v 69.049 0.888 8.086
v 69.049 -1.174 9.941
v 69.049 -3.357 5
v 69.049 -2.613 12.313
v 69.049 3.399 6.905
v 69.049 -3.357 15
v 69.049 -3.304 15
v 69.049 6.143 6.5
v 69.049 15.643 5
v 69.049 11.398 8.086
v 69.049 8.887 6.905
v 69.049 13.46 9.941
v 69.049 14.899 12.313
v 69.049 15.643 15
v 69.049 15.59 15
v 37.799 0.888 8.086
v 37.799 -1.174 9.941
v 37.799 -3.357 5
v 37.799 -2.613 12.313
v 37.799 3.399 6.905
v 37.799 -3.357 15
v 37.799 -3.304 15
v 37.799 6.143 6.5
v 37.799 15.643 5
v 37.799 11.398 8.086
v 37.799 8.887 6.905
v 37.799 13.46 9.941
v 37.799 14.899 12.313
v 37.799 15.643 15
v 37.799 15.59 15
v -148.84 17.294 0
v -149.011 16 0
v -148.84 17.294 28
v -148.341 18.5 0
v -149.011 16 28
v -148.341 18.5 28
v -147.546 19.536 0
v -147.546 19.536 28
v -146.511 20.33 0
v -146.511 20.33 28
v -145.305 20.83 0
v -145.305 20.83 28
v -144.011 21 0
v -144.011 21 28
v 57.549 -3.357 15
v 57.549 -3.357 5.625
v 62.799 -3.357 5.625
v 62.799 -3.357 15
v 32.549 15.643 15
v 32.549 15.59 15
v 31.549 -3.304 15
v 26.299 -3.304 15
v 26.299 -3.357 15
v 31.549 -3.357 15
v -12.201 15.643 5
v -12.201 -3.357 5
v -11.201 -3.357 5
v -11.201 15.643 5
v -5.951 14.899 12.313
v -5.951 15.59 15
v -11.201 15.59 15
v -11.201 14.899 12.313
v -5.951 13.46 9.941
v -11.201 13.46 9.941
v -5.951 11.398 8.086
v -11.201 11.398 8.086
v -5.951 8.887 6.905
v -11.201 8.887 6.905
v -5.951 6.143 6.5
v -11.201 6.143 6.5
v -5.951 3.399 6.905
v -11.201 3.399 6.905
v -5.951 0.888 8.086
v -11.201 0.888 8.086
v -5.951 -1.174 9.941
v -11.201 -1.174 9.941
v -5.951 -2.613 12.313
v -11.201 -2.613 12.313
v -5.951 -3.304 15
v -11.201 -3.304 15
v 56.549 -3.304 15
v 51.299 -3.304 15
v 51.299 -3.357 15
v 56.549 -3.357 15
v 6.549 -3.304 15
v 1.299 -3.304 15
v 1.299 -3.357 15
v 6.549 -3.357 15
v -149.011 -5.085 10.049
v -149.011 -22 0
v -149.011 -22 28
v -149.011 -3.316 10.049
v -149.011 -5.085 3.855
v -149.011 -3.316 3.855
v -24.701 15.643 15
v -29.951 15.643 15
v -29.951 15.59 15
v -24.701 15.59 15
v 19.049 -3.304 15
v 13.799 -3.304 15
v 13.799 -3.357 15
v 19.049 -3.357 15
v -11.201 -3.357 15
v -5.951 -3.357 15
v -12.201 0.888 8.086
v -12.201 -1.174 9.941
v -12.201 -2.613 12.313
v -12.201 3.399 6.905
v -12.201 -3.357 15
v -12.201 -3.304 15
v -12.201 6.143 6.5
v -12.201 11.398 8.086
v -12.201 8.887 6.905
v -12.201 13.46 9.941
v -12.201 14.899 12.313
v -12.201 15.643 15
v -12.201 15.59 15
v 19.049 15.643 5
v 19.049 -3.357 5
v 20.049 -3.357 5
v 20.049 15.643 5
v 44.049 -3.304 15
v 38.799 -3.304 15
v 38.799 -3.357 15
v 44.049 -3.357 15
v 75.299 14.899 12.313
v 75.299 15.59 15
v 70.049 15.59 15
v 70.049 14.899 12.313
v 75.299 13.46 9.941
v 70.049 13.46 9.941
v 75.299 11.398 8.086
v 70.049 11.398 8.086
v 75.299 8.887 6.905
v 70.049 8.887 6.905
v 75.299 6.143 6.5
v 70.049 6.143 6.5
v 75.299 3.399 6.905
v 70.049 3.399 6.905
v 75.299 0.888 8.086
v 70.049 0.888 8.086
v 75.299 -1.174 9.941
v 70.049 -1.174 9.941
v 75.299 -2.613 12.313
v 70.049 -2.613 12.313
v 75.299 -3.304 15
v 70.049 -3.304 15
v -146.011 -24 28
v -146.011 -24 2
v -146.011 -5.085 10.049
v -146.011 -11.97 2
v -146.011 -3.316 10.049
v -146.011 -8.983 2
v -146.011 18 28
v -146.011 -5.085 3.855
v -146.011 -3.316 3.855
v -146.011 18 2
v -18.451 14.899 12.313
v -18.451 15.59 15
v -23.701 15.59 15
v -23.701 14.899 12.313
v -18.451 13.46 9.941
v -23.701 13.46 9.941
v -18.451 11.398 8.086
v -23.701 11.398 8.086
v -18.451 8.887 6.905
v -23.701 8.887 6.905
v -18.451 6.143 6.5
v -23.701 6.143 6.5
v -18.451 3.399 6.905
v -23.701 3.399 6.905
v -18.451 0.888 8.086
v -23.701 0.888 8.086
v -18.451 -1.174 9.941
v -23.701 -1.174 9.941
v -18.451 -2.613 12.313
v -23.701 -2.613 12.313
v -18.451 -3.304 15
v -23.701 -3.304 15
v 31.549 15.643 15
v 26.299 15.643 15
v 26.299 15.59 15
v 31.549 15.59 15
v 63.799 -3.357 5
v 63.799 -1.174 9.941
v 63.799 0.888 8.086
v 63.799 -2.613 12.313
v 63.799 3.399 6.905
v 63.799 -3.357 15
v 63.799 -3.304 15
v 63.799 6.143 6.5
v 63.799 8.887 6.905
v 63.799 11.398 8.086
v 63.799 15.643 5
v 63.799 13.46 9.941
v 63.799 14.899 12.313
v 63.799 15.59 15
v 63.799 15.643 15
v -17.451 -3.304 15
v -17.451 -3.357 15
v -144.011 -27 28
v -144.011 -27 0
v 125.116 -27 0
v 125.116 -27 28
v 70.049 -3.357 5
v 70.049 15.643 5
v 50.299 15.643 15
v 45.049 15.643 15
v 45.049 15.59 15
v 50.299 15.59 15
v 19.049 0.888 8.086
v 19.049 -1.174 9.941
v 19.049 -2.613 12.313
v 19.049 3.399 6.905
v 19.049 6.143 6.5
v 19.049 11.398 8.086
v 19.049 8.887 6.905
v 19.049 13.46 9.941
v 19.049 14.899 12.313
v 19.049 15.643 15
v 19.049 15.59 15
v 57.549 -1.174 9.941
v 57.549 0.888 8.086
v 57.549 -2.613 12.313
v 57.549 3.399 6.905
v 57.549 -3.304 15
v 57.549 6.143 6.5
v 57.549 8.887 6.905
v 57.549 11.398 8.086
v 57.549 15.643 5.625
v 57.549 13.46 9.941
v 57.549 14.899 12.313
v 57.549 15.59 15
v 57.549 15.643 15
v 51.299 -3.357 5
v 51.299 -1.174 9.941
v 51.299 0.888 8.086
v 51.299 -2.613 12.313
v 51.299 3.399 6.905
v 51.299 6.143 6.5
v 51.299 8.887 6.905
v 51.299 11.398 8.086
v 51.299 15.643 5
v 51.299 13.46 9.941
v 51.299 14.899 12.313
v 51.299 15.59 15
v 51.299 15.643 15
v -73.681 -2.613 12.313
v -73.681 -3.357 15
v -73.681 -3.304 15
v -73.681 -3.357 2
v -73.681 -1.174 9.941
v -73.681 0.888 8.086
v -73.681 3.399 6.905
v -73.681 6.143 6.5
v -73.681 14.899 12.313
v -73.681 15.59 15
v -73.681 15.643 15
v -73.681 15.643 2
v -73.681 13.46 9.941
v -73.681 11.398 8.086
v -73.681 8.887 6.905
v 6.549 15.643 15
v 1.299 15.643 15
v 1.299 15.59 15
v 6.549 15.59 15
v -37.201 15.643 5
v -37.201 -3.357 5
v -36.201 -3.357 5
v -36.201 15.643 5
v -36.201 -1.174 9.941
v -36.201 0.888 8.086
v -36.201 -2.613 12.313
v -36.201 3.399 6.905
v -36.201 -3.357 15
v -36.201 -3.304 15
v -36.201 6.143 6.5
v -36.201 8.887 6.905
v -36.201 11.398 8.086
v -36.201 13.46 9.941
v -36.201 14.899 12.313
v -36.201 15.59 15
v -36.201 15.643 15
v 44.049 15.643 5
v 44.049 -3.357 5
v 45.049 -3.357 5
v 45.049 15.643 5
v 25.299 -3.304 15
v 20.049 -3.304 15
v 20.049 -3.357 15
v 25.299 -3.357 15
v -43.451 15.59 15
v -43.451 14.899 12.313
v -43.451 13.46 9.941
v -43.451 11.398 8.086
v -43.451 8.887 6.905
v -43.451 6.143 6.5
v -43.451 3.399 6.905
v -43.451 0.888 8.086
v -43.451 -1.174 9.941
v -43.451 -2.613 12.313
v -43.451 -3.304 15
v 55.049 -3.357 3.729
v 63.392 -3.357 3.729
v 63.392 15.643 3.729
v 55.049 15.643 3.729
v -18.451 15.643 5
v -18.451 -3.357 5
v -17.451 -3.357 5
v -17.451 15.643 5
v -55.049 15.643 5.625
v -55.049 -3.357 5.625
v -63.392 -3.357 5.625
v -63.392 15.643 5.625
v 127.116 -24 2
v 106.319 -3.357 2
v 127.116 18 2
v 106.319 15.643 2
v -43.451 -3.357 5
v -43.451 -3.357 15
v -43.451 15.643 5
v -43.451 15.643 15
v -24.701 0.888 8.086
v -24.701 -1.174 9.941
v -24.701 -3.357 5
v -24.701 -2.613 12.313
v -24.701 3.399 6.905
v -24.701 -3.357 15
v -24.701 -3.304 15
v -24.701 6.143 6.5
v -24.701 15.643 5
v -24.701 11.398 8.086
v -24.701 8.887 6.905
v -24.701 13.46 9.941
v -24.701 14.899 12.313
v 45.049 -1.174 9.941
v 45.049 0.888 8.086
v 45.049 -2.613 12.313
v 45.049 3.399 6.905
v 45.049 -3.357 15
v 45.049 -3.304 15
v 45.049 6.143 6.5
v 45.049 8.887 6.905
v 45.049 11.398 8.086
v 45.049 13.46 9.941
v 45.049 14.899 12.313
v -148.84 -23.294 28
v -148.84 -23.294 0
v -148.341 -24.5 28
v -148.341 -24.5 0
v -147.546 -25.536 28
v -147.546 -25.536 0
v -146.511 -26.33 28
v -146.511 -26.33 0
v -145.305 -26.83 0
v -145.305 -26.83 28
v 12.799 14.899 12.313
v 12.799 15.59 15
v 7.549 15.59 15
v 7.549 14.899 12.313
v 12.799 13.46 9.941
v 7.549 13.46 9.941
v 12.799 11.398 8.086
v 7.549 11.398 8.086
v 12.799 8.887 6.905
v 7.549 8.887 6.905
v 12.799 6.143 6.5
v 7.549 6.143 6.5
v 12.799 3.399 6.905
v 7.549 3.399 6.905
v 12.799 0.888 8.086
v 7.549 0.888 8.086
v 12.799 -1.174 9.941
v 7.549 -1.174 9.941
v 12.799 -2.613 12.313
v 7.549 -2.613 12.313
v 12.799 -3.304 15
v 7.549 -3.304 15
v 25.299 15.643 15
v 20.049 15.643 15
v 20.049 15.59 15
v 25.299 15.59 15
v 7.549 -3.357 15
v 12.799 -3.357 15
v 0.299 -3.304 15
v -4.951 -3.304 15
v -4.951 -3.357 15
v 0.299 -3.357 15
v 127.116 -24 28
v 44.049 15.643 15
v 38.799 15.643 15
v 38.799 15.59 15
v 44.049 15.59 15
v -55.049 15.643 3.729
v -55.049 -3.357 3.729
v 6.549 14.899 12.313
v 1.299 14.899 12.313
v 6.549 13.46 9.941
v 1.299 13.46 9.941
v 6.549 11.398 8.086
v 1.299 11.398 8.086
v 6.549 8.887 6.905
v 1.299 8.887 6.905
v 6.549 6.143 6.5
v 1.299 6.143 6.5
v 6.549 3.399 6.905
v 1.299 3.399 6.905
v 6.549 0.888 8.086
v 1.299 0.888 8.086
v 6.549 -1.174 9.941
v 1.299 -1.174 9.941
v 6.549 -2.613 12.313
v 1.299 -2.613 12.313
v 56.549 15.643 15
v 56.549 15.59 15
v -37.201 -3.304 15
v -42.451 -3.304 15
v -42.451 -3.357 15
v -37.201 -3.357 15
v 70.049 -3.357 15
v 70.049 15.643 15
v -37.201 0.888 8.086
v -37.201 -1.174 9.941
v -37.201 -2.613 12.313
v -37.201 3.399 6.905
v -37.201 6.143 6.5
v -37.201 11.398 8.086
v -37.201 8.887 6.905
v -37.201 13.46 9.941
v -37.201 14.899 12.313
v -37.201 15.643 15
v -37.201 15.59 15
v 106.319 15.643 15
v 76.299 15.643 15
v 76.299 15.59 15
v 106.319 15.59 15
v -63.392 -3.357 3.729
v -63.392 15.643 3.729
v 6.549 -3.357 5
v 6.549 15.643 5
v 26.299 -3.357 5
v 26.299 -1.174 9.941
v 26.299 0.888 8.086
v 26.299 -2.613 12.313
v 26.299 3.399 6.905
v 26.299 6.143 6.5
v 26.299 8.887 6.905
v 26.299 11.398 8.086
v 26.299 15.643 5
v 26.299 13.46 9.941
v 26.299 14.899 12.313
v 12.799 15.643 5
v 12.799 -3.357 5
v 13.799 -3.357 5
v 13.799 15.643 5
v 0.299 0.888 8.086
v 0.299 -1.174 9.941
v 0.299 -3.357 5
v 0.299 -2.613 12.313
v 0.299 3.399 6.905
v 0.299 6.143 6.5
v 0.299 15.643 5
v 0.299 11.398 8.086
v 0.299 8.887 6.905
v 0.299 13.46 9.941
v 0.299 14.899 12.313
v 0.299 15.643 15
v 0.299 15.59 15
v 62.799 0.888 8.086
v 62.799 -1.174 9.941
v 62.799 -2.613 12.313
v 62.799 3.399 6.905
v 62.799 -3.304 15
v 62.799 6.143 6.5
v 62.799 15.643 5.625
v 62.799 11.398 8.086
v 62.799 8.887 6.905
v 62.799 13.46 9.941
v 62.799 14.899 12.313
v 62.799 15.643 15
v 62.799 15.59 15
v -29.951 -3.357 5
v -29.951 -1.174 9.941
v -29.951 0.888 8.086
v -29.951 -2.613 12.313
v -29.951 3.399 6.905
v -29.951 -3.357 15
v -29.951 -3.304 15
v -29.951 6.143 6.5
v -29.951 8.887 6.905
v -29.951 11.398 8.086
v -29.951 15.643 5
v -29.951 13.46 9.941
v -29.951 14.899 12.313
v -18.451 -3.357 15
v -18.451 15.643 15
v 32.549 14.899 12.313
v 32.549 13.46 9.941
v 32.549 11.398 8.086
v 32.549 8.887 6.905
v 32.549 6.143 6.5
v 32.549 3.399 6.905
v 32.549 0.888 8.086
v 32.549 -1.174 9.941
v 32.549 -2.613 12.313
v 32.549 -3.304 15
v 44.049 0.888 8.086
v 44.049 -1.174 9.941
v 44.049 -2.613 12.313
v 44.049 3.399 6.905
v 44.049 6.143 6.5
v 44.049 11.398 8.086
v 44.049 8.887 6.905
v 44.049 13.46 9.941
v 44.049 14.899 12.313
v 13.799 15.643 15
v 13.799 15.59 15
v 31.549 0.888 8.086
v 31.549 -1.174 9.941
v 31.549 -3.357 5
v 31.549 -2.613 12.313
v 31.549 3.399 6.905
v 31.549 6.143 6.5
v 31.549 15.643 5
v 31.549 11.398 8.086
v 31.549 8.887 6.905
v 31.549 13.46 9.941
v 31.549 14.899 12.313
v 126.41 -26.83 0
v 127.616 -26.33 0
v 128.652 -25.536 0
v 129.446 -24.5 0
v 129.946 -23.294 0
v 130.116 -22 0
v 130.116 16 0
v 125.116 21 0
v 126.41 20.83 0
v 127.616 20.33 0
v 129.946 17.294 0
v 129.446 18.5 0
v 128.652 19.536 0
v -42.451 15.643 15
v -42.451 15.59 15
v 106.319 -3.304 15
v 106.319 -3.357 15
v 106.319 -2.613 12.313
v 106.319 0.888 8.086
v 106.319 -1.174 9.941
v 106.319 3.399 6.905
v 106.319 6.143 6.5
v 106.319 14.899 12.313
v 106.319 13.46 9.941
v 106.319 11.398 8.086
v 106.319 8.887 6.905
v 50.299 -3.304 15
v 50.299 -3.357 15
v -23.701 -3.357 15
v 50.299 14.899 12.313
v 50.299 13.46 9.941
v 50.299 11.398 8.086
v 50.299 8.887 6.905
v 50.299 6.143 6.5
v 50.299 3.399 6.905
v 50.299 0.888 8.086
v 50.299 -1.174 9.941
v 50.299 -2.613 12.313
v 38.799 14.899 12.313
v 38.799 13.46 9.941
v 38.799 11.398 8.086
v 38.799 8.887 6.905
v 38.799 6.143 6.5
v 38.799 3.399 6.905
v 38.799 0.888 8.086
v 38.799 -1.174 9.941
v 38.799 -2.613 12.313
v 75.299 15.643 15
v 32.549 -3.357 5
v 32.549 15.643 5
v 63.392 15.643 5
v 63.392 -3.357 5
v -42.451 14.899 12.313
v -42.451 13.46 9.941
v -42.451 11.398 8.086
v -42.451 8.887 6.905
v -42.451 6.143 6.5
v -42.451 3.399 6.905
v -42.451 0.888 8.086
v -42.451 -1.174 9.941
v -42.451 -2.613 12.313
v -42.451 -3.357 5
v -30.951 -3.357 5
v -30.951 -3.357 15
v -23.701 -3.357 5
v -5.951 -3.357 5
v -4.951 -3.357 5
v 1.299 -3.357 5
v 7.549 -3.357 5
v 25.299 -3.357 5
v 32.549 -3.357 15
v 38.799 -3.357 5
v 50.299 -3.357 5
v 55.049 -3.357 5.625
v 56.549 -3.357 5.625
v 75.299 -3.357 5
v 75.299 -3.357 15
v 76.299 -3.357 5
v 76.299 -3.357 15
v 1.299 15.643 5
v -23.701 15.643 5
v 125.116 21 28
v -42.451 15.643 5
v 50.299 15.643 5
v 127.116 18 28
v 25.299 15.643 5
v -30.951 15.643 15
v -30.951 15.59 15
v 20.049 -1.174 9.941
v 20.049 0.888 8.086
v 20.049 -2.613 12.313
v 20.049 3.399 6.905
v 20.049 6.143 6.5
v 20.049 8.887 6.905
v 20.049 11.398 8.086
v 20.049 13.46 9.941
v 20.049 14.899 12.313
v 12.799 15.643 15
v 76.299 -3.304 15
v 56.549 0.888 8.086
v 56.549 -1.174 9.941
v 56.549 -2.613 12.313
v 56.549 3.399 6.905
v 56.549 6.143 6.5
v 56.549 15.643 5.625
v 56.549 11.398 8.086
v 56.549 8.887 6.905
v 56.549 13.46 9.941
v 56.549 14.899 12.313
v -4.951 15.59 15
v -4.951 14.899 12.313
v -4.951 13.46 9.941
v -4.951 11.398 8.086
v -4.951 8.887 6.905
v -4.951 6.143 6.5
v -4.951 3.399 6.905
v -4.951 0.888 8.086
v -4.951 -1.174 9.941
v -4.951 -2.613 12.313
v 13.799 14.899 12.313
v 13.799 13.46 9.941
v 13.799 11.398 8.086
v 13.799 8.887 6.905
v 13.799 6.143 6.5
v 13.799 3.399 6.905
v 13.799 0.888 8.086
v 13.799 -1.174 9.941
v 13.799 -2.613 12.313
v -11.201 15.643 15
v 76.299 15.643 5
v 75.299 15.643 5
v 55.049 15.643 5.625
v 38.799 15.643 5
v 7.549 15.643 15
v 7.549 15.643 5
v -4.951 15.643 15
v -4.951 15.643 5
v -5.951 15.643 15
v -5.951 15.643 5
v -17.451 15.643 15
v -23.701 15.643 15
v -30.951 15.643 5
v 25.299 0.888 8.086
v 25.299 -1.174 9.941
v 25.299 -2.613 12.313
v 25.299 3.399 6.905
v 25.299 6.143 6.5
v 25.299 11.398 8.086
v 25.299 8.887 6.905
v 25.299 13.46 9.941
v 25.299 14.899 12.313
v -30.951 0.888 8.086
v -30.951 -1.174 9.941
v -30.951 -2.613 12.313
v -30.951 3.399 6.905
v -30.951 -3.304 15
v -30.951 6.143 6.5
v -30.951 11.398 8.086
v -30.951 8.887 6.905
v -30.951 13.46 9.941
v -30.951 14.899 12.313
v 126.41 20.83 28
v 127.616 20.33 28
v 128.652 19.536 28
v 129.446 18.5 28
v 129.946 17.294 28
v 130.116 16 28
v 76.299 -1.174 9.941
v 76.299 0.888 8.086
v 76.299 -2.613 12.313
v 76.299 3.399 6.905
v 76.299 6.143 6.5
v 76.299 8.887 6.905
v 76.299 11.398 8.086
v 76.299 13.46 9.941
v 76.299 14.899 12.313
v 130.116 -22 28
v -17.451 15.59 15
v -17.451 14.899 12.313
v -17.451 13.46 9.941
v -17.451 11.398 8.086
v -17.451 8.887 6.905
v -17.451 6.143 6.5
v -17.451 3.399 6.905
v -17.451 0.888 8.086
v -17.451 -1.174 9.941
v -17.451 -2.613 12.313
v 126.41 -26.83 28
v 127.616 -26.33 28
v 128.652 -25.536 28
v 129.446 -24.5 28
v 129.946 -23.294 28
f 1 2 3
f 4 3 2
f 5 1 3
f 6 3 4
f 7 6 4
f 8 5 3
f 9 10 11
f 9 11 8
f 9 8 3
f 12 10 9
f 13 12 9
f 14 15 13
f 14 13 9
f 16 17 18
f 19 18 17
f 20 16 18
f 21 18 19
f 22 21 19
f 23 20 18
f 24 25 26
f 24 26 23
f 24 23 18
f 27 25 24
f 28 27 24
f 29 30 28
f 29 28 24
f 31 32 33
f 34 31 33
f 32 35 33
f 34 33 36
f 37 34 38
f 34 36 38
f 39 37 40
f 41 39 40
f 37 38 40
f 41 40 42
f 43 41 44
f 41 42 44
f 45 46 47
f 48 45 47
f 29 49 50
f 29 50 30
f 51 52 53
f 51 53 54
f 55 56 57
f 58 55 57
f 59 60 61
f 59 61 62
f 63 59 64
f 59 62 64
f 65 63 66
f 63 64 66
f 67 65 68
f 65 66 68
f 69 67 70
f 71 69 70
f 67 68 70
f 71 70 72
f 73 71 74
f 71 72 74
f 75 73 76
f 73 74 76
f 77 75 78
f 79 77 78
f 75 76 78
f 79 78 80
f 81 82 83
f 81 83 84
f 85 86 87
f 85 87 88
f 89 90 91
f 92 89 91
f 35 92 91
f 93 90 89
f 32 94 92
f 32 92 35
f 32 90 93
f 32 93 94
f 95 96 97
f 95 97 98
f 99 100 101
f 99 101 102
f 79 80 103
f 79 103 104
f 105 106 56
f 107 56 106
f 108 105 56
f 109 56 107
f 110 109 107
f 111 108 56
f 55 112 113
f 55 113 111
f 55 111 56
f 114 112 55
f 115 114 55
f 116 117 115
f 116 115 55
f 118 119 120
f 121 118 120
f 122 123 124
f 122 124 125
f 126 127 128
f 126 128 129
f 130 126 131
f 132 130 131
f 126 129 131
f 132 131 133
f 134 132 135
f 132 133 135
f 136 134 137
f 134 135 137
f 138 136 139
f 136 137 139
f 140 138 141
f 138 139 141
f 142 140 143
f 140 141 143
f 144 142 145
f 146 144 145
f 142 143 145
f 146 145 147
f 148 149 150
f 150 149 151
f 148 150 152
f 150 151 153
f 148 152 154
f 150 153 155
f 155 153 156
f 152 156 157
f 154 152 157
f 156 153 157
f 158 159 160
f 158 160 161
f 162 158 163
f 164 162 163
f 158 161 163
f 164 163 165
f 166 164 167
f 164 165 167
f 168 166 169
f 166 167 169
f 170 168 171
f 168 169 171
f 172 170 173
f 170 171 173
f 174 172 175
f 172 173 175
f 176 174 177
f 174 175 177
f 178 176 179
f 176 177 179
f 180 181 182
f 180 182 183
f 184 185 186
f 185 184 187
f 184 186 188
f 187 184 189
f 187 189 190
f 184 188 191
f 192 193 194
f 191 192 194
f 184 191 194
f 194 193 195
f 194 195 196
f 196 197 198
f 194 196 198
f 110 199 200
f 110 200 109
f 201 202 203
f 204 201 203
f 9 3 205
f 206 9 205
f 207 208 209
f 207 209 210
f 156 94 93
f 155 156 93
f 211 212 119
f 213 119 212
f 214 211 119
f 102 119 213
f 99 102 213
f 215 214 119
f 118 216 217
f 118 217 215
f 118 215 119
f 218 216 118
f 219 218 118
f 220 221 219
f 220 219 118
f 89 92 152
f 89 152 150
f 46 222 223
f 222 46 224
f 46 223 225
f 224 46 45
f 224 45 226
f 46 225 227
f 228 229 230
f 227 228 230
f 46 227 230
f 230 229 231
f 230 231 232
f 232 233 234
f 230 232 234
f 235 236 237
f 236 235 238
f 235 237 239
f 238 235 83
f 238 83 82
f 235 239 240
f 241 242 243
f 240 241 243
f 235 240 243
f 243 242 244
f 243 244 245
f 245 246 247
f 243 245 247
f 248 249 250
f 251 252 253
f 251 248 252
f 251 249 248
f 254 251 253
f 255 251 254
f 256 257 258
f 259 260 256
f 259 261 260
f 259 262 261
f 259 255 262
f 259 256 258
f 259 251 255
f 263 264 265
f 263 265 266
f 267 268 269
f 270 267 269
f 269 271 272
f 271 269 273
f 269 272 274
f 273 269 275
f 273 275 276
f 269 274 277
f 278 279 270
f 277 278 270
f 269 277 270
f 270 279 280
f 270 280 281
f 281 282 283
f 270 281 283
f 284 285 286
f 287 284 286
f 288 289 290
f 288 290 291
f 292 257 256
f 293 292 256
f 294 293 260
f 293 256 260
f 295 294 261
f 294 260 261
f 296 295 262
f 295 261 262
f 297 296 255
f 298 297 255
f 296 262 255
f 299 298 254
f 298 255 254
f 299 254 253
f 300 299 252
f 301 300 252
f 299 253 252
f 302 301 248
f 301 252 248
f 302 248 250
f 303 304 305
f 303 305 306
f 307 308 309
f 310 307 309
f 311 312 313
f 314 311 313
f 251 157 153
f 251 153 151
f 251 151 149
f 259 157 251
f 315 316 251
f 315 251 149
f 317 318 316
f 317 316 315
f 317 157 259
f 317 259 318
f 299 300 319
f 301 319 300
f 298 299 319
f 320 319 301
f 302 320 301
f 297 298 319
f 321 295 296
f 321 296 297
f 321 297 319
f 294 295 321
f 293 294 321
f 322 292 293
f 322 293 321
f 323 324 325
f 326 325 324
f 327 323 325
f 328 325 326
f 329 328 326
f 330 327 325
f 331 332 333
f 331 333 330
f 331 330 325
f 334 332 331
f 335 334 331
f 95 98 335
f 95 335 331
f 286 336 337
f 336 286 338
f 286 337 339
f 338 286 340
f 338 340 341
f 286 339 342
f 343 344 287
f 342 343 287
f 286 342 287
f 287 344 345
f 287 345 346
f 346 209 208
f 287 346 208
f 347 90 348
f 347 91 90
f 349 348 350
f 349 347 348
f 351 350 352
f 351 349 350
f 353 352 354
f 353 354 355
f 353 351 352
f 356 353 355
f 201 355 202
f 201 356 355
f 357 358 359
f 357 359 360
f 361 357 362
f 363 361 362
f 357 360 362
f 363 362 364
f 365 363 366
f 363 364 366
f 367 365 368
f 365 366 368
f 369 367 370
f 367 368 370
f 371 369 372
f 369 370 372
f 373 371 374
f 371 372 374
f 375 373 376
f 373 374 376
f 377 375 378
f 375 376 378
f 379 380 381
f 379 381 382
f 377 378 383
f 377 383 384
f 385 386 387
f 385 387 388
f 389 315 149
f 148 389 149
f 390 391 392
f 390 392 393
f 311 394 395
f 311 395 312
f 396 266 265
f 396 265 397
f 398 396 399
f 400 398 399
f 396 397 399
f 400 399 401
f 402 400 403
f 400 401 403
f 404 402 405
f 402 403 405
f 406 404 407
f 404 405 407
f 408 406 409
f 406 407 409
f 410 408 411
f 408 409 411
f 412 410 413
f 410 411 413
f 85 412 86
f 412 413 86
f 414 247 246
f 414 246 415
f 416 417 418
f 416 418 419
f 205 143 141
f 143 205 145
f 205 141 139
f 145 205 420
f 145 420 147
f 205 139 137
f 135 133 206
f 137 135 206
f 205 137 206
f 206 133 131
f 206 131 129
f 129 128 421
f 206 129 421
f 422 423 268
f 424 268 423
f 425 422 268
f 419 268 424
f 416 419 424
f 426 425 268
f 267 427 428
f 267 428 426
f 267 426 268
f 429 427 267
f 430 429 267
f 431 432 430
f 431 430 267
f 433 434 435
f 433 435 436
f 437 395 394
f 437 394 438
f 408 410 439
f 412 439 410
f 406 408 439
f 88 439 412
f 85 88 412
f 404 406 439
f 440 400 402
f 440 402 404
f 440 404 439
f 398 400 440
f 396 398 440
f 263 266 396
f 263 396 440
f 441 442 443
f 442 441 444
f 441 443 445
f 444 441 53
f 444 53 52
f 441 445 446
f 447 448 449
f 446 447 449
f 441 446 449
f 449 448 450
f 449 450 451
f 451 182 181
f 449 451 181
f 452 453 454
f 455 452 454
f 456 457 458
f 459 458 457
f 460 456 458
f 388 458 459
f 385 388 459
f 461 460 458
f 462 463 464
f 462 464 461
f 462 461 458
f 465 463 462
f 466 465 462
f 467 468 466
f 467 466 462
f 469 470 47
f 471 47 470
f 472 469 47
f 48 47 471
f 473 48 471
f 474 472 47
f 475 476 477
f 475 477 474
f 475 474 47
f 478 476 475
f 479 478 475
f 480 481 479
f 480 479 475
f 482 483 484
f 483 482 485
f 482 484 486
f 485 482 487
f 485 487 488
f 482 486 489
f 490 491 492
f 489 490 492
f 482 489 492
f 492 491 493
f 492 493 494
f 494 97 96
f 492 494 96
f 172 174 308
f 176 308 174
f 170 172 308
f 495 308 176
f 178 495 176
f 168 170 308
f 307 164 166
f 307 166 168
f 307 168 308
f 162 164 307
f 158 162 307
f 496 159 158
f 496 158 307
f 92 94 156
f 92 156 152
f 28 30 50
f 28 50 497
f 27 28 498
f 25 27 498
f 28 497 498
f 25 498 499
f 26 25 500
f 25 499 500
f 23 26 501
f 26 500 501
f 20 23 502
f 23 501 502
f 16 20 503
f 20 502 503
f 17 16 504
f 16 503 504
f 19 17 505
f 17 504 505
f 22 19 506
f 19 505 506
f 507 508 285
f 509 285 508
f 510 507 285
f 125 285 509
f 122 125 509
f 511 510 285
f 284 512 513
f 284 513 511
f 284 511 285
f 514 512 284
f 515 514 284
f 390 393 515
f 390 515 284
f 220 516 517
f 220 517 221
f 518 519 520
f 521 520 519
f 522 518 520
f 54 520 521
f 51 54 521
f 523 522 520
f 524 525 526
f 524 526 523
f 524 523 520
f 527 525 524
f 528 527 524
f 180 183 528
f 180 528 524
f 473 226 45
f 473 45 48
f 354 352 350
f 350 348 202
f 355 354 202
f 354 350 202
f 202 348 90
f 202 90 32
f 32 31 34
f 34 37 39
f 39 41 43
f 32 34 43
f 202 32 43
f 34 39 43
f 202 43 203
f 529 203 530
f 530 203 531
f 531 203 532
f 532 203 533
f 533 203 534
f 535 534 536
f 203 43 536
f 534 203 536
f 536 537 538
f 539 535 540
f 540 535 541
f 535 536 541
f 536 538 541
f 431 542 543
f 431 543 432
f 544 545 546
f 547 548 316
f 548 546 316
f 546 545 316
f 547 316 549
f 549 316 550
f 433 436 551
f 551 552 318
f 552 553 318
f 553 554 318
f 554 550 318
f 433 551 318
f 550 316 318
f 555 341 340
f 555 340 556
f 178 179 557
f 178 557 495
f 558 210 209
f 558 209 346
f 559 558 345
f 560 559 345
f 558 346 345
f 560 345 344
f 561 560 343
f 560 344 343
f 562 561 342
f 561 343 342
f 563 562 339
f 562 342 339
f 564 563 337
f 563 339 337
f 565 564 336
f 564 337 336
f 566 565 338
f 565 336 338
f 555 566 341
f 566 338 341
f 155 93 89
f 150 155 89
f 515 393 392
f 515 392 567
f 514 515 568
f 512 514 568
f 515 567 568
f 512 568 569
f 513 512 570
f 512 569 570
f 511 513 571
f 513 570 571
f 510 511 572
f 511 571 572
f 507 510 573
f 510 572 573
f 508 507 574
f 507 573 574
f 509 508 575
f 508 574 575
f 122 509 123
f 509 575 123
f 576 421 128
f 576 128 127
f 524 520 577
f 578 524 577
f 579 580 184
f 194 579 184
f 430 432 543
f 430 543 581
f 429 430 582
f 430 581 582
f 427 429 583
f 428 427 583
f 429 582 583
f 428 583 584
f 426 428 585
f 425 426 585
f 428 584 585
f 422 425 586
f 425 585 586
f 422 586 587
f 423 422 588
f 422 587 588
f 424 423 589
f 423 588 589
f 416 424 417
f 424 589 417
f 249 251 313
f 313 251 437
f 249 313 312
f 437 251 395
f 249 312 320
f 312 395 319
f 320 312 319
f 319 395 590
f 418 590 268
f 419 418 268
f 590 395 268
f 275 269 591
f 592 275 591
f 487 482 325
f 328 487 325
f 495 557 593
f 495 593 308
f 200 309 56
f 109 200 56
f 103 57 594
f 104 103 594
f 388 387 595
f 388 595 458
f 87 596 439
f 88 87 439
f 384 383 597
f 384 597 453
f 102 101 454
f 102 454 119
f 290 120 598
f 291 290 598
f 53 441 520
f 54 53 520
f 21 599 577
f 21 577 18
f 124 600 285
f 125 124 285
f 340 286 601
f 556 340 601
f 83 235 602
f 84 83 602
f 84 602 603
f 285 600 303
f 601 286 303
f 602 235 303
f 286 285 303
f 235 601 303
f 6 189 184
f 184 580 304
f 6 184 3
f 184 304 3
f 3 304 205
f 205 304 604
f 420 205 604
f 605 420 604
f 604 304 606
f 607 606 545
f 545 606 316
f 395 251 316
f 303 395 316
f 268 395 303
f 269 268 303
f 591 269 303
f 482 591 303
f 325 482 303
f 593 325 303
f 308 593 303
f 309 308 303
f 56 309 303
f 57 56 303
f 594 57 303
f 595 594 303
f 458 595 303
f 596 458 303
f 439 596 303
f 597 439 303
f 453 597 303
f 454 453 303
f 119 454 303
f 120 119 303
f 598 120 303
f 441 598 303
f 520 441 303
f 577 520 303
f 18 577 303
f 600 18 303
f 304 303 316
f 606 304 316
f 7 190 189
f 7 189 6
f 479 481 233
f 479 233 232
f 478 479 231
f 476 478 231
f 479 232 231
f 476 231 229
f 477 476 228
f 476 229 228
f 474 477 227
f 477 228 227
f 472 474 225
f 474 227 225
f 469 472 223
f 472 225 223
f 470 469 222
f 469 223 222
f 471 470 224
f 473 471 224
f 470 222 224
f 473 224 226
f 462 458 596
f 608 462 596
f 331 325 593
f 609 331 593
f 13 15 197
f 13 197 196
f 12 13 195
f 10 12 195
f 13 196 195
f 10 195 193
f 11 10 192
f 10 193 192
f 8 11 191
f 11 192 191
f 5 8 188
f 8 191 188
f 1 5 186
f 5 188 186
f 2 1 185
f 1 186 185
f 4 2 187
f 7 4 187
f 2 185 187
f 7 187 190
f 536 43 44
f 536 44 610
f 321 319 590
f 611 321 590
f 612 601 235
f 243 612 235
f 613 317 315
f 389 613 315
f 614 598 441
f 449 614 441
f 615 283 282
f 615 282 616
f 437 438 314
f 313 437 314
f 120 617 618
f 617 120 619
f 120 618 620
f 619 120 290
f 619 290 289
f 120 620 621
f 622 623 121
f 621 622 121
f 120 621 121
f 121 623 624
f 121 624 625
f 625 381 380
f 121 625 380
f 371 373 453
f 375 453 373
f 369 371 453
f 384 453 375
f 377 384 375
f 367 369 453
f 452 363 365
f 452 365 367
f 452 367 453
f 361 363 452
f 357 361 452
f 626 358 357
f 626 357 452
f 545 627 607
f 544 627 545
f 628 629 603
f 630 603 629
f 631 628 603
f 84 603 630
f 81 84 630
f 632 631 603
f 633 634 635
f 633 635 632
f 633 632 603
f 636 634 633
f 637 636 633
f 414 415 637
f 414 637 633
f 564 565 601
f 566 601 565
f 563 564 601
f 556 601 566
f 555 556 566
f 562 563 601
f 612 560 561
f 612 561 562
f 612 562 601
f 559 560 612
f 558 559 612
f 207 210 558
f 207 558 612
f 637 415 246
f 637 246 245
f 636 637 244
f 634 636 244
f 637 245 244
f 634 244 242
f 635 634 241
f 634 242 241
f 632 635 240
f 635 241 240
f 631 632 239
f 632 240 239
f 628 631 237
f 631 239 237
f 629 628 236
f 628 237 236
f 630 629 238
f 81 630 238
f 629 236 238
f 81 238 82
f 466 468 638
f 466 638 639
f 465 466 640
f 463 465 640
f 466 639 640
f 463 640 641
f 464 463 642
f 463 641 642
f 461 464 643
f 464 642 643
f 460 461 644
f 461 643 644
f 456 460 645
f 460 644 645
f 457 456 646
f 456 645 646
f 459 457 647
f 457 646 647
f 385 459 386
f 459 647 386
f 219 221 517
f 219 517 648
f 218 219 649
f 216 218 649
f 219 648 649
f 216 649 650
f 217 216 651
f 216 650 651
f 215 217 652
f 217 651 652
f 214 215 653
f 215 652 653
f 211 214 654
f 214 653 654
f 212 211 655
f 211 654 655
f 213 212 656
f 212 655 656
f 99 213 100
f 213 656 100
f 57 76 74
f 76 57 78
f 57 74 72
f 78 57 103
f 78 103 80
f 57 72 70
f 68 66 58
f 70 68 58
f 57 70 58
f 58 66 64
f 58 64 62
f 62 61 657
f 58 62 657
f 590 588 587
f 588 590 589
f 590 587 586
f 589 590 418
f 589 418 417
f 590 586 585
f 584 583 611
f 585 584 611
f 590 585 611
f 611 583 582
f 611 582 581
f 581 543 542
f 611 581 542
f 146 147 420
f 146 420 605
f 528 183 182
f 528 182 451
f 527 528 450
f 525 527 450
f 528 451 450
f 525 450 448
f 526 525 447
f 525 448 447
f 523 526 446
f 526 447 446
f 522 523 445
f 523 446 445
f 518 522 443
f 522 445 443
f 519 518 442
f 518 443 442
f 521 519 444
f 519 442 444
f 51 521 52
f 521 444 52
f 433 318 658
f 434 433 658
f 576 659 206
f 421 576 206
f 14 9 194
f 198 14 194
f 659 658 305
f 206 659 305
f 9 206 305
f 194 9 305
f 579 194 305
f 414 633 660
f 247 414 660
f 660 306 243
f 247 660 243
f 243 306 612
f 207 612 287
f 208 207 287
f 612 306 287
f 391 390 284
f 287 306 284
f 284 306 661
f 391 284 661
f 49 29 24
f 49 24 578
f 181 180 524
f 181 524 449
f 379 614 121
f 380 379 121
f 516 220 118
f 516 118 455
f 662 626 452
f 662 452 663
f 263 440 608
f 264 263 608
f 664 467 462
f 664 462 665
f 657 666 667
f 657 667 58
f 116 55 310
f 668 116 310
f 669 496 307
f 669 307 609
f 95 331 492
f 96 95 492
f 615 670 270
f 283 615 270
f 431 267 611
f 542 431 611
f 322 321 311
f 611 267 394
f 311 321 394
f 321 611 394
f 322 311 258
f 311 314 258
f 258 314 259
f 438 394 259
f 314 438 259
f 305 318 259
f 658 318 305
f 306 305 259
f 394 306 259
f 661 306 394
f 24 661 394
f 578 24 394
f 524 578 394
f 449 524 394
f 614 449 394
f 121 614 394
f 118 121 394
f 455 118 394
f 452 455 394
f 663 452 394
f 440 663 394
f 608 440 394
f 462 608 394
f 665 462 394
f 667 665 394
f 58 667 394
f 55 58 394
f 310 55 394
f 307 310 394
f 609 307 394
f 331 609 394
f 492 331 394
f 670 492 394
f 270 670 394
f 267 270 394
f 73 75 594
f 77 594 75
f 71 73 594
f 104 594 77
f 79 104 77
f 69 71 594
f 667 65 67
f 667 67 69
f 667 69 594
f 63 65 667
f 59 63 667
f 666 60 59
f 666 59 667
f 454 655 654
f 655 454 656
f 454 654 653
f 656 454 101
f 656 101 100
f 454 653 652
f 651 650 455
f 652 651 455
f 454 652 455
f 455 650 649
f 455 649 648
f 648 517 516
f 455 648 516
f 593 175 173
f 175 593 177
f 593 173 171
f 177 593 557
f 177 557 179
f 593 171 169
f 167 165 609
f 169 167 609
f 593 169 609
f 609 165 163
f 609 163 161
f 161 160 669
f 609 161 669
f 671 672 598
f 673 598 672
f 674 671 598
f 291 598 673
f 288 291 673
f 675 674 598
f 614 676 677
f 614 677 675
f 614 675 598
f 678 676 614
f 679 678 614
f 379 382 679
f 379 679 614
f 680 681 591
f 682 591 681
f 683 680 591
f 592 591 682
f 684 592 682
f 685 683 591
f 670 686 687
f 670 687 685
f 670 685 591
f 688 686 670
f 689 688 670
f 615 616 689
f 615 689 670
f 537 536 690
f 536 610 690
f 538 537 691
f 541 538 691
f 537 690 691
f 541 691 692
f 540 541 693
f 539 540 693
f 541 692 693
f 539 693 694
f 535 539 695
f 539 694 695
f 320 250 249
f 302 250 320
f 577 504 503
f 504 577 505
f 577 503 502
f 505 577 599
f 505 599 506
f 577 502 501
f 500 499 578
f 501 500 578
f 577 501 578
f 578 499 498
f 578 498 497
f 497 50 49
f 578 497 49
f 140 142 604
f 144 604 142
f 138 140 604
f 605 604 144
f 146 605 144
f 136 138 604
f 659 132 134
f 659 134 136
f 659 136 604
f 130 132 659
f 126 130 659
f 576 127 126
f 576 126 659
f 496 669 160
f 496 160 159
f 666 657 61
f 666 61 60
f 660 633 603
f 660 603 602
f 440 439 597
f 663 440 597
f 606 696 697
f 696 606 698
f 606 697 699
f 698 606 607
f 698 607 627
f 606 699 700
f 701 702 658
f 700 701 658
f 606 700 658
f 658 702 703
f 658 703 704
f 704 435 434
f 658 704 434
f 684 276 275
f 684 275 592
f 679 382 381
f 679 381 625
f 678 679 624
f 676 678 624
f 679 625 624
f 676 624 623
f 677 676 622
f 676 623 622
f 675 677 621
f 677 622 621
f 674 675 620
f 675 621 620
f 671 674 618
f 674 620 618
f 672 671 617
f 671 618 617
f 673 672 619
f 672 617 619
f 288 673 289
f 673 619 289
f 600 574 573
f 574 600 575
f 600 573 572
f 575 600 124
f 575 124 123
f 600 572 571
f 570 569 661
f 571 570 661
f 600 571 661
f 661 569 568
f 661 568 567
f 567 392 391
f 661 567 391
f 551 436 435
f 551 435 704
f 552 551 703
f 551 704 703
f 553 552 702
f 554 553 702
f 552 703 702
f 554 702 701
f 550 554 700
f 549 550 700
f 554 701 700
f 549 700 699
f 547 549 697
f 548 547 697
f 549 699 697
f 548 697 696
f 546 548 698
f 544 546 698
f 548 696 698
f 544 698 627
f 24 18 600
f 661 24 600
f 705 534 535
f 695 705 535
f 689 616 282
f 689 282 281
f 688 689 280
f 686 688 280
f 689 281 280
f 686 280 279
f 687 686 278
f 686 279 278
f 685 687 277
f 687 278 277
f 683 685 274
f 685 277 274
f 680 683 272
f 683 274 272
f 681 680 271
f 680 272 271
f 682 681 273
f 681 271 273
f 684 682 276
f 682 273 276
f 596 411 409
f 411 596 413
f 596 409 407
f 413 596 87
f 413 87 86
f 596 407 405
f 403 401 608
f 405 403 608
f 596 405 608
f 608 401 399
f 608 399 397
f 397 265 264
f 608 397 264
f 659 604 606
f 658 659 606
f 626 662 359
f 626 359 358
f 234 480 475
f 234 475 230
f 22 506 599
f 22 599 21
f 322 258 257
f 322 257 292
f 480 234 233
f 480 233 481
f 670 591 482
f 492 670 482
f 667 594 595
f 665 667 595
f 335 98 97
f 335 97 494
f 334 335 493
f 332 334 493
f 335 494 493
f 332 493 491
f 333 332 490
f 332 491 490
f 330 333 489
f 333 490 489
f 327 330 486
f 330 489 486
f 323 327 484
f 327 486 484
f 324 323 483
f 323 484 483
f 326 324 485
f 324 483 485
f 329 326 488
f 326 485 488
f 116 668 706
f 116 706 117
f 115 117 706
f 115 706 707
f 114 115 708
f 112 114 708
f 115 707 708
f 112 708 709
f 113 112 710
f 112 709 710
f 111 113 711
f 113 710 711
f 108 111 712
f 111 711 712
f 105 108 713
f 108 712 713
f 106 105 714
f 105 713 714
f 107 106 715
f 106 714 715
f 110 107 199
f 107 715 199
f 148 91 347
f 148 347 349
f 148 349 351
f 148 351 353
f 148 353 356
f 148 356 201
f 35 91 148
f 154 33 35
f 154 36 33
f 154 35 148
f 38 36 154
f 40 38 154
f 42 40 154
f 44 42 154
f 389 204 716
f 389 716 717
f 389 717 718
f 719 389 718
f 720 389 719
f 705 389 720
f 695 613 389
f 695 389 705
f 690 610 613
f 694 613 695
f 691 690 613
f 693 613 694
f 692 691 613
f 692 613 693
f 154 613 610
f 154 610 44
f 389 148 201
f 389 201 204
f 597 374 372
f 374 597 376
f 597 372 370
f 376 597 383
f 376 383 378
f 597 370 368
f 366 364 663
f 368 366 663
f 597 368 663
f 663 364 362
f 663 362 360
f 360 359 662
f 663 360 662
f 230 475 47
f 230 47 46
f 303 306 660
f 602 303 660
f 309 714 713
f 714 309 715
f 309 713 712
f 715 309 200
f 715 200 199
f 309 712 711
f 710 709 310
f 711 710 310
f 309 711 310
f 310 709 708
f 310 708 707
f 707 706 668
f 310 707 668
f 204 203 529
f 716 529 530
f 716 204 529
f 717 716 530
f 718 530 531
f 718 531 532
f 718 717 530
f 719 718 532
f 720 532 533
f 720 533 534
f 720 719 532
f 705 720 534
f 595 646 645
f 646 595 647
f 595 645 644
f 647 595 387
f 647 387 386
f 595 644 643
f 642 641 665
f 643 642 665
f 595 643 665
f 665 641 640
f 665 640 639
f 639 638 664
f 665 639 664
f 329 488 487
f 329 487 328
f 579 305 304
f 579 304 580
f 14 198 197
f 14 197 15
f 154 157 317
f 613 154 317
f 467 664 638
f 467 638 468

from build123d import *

# Parameters (mm, degrees)
F0_W      = 30.2304342687
F0_H      = 19
F0_W_2    = 0.5
F0_W_3    = 5.25
F0_W_4    = 30.0195657313
F1_DEPTH  = 15
F0_W_5    = 6.6043436527
F0_H_2    = 2.9876781628
F0_W_6    = 51
F0_H_3    = 18
F0_W_7    = 6.3103074431
F3_DEPTH  = 2
F4_R      = 9.5
F5_DEPTH  = 180
F2_W      = 0.5
F2_H      = 19
F7_DEPTH  = 10
F6_W      = 8.3426982164
F6_H      = 1.8960679881
F8_DEPTH  = 19
F0_W_8    = 279.1266992456
F0_H_4    = 48
F9_DEPTH  = 28
F10_W     = 1.7696609721
F10_H     = 6.1938203871
F11_DEPTH = 5
F12_R     = 5


# Not quite as in the source:
# - a feature names something its author has since deleted; it is built from what else it names


with BuildPart() as f1:
    # F0 (on Top) → F1 (new body)
    with BuildSketch(Plane.XY):
        with Locations((-58.5658399016, 6.1430045813)):
            Rectangle(F0_W, F0_H)
        with Locations((-43.2006227672, 6.1430045813)):
            Rectangle(F0_W_2, F0_H)
        with Locations((-42.7006227672, 6.1430045813)):
            Rectangle(F0_W_2, F0_H)
        with Locations((-39.8256227672, 6.1430045813)):
            Rectangle(F0_W_3, F0_H)
        with Locations((-36.9506227672, 6.1430045813)):
            Rectangle(F0_W_2, F0_H)
        with Locations((-36.4506227672, 6.1430045813)):
            Rectangle(F0_W_2, F0_H)
        with Locations((-33.5756227672, 6.1430045813)):
            Rectangle(F0_W_3, F0_H)
        with Locations((-30.7006227672, 6.1430045813)):
            Rectangle(F0_W_2, F0_H)
        with Locations((-30.2006227672, 6.1430045813)):
            Rectangle(F0_W_2, F0_H)
        with Locations((-27.3256227672, 6.1430045813)):
            Rectangle(F0_W_3, F0_H)
        with Locations((-24.4506227672, 6.1430045813)):
            Rectangle(F0_W_2, F0_H)
        with Locations((-23.9506227672, 6.1430045813)):
            Rectangle(F0_W_2, F0_H)
        with Locations((-21.0756227672, 6.1430045813)):
            Rectangle(F0_W_3, F0_H)
        with Locations((-18.2006227672, 6.1430045813)):
            Rectangle(F0_W_2, F0_H)
        with Locations((-17.7006227672, 6.1430045813)):
            Rectangle(F0_W_2, F0_H)
        with Locations((-14.8256227672, 6.1430045813)):
            Rectangle(F0_W_3, F0_H)
        with Locations((-11.9506227672, 6.1430045813)):
            Rectangle(F0_W_2, F0_H)
        with Locations((-11.4506227672, 6.1430045813)):
            Rectangle(F0_W_2, F0_H)
        with Locations((-8.5756227672, 6.1430045813)):
            Rectangle(F0_W_3, F0_H)
        with Locations((-5.7006227672, 6.1430045813)):
            Rectangle(F0_W_2, F0_H)
        with Locations((-5.2006227672, 6.1430045813)):
            Rectangle(F0_W_2, F0_H)
        with Locations((-2.3256227672, 6.1430045813)):
            Rectangle(F0_W_3, F0_H)
        with Locations((0.5493772328, 6.1430045813)):
            Rectangle(F0_W_2, F0_H)
        with Locations((1.0493772328, 6.1430045813)):
            Rectangle(F0_W_2, F0_H)
        with Locations((3.9243772328, 6.1430045813)):
            Rectangle(F0_W_3, F0_H)
        with Locations((6.7993772328, 6.1430045813)):
            Rectangle(F0_W_2, F0_H)
        with Locations((7.2993772328, 6.1430045813)):
            Rectangle(F0_W_2, F0_H)
        with Locations((10.1743772328, 6.1430045813)):
            Rectangle(F0_W_3, F0_H)
        with Locations((13.0493772328, 6.1430045813)):
            Rectangle(F0_W_2, F0_H)
        with Locations((13.5493772328, 6.1430045813)):
            Rectangle(F0_W_2, F0_H)
        with Locations((16.4243772328, 6.1430045813)):
            Rectangle(F0_W_3, F0_H)
        with Locations((19.2993772328, 6.1430045813)):
            Rectangle(F0_W_2, F0_H)
        with Locations((19.7993772328, 6.1430045813)):
            Rectangle(F0_W_2, F0_H)
        with Locations((22.6743772328, 6.1430045813)):
            Rectangle(F0_W_3, F0_H)
        with Locations((25.5493772328, 6.1430045813)):
            Rectangle(F0_W_2, F0_H)
        with Locations((26.0493772328, 6.1430045813)):
            Rectangle(F0_W_2, F0_H)
        with Locations((28.9243772328, 6.1430045813)):
            Rectangle(F0_W_3, F0_H)
        with Locations((31.7993772328, 6.1430045813)):
            Rectangle(F0_W_2, F0_H)
        with Locations((32.2993772328, 6.1430045813)):
            Rectangle(F0_W_2, F0_H)
        with Locations((35.1743772328, 6.1430045813)):
            Rectangle(F0_W_3, F0_H)
        with Locations((38.0493772328, 6.1430045813)):
            Rectangle(F0_W_2, F0_H)
        with Locations((38.5493772328, 6.1430045813)):
            Rectangle(F0_W_2, F0_H)
        with Locations((41.4243772328, 6.1430045813)):
            Rectangle(F0_W_3, F0_H)
        with Locations((44.2993772328, 6.1430045813)):
            Rectangle(F0_W_2, F0_H)
        with Locations((44.7993772328, 6.1430045813)):
            Rectangle(F0_W_2, F0_H)
        with Locations((47.6743772328, 6.1430045813)):
            Rectangle(F0_W_3, F0_H)
        with Locations((50.5493772328, 6.1430045813)):
            Rectangle(F0_W_2, F0_H)
        with Locations((51.0493772328, 6.1430045813)):
            Rectangle(F0_W_2, F0_H)
        with Locations((53.9243772328, 6.1430045813)):
            Rectangle(F0_W_3, F0_H)
        with Locations((56.7993772328, 6.1430045813)):
            Rectangle(F0_W_2, F0_H)
        with Locations((57.2993772328, 6.1430045813)):
            Rectangle(F0_W_2, F0_H)
        with Locations((60.1743772328, 6.1430045813)):
            Rectangle(F0_W_3, F0_H)
        with Locations((63.0493772328, 6.1430045813)):
            Rectangle(F0_W_2, F0_H)
        with Locations((63.5493772328, 6.1430045813)):
            Rectangle(F0_W_2, F0_H)
        with Locations((66.4243772328, 6.1430045813)):
            Rectangle(F0_W_3, F0_H)
        with Locations((69.2993772328, 6.1430045813)):
            Rectangle(F0_W_2, F0_H)
        with Locations((69.7993772328, 6.1430045813)):
            Rectangle(F0_W_2, F0_H)
        with Locations((72.6743772328, 6.1430045813)):
            Rectangle(F0_W_3, F0_H)
        with Locations((75.5493772328, 6.1430045813)):
            Rectangle(F0_W_2, F0_H)
        with Locations((76.0493772328, 6.1430045813)):
            Rectangle(F0_W_2, F0_H)
        with Locations((91.3091600984, 6.1430045813)):
            Rectangle(F0_W_4, F0_H)
    extrude(amount=F1_DEPTH)

    # F0 (on Top) → F3 (join)
    with BuildSketch(Plane.XY):
        Polygon((-146.0105562806, -24), (127.116142965, -24), (127.116142965, 18), (-92.0105562806, 18), (-92.0105562806, -3), (-146.0105562806, -3), (-146.0105562806, -8.9827831835), (-139.7002488375, -8.9827831835), (-139.7002488375, -11.9704613462), (-146.0105562806, -11.9704613462), align=None)
        with Locations((-95.1995551586, -10.7911149971)):
            Rectangle(F0_W_5, F0_H_2, mode=Mode.SUBTRACT)
        Polygon((-73.6810570359, -3.3569954187), (-73.6810570359, 15.6430045813), (-43.4506227672, 15.6430045813), (-42.9506227672, 15.6430045813), (-42.4506227672, 15.6430045813), (-37.2006227672, 15.6430045813), (-36.7006227672, 15.6430045813), (-36.2006227672, 15.6430045813), (-30.9506227672, 15.6430045813), (-30.4506227672, 15.6430045813), (-29.9506227672, 15.6430045813), (-24.7006227672, 15.6430045813), (-24.2006227672, 15.6430045813), (-23.7006227672, 15.6430045813), (-18.4506227672, 15.6430045813), (-17.9506227672, 15.6430045813), (-17.4506227672, 15.6430045813), (-12.2006227672, 15.6430045813), (-11.7006227672, 15.6430045813), (-11.2006227672, 15.6430045813), (-5.9506227672, 15.6430045813), (-5.4506227672, 15.6430045813), (-4.9506227672, 15.6430045813), (0.2993772328, 15.6430045813), (0.7993772328, 15.6430045813), (1.2993772328, 15.6430045813), (6.5493772328, 15.6430045813), (7.0493772328, 15.6430045813), (7.5493772328, 15.6430045813), (12.7993772328, 15.6430045813), (13.2993772328, 15.6430045813), (13.7993772328, 15.6430045813), (19.0493772328, 15.6430045813), (19.5493772328, 15.6430045813), (20.0493772328, 15.6430045813), (25.2993772328, 15.6430045813), (25.7993772328, 15.6430045813), (26.2993772328, 15.6430045813), (31.5493772328, 15.6430045813), (32.0493772328, 15.6430045813), (32.5493772328, 15.6430045813), (37.7993772328, 15.6430045813), (38.2993772328, 15.6430045813), (38.7993772328, 15.6430045813), (44.0493772328, 15.6430045813), (44.5493772328, 15.6430045813), (45.0493772328, 15.6430045813), (50.2993772328, 15.6430045813), (50.7993772328, 15.6430045813), (51.2993772328, 15.6430045813), (56.5493772328, 15.6430045813), (57.0493772328, 15.6430045813), (57.5493772328, 15.6430045813), (62.7993772328, 15.6430045813), (63.2993772328, 15.6430045813), (63.7993772328, 15.6430045813), (69.0493772328, 15.6430045813), (69.5493772328, 15.6430045813), (70.0493772328, 15.6430045813), (75.2993772328, 15.6430045813), (75.7993772328, 15.6430045813), (76.2993772328, 15.6430045813), (106.3189429641, 15.6430045813), (106.3189429641, -3.3569954187), (76.2993772328, -3.3569954187), (75.7993772328, -3.3569954187), (75.2993772328, -3.3569954187), (70.0493772328, -3.3569954187), (69.5493772328, -3.3569954187), (69.0493772328, -3.3569954187), (63.7993772328, -3.3569954187), (63.2993772328, -3.3569954187), (62.7993772328, -3.3569954187), (57.5493772328, -3.3569954187), (57.0493772328, -3.3569954187), (56.5493772328, -3.3569954187), (51.2993772328, -3.3569954187), (50.7993772328, -3.3569954187), (50.2993772328, -3.3569954187), (45.0493772328, -3.3569954187), (44.5493772328, -3.3569954187), (44.0493772328, -3.3569954187), (38.7993772328, -3.3569954187), (38.2993772328, -3.3569954187), (37.7993772328, -3.3569954187), (32.5493772328, -3.3569954187), (32.0493772328, -3.3569954187), (31.5493772328, -3.3569954187), (26.2993772328, -3.3569954187), (25.7993772328, -3.3569954187), (25.2993772328, -3.3569954187), (20.0493772328, -3.3569954187), (19.5493772328, -3.3569954187), (19.0493772328, -3.3569954187), (13.7993772328, -3.3569954187), (13.2993772328, -3.3569954187), (12.7993772328, -3.3569954187), (7.5493772328, -3.3569954187), (7.0493772328, -3.3569954187), (6.5493772328, -3.3569954187), (1.2993772328, -3.3569954187), (0.7993772328, -3.3569954187), (0.2993772328, -3.3569954187), (-4.9506227672, -3.3569954187), (-5.4506227672, -3.3569954187), (-5.9506227672, -3.3569954187), (-11.2006227672, -3.3569954187), (-11.7006227672, -3.3569954187), (-12.2006227672, -3.3569954187), (-17.4506227672, -3.3569954187), (-17.9506227672, -3.3569954187), (-18.4506227672, -3.3569954187), (-23.7006227672, -3.3569954187), (-24.2006227672, -3.3569954187), (-24.7006227672, -3.3569954187), (-29.9506227672, -3.3569954187), (-30.4506227672, -3.3569954187), (-30.9506227672, -3.3569954187), (-36.2006227672, -3.3569954187), (-36.7006227672, -3.3569954187), (-37.2006227672, -3.3569954187), (-42.4506227672, -3.3569954187), (-42.9506227672, -3.3569954187), (-43.4506227672, -3.3569954187), align=None, mode=Mode.SUBTRACT)
        with Locations((-120.5105562806, 9)):
            Rectangle(F0_W_6, F0_H_3)
        Polygon((-92.0105562806, -3), (-92.0105562806, 18), (-95.0105562806, 18), (-95.0105562806, 0), (-146.0105562806, 0), (-146.0105562806, -3), align=None)
        with Locations((-142.855402559, -10.4766222648)):
            Rectangle(F0_W_7, F0_H_2)
        with Locations((-95.1995551586, -10.7911149971)):
            Rectangle(F0_W_5, F0_H_2)
    extrude(amount=F3_DEPTH)

    # F4 (on face) → F5 (cut)
    with BuildSketch(Plane(origin=(-73.6810570359, 0, 0), x_dir=(0, -1, 0), z_dir=(-1, 0, 0))):
        with Locations((-6.1430045813, 16)):
            Circle(F4_R)
    extrude(amount=-F5_DEPTH, mode=Mode.SUBTRACT)

    # F2 (on face) → F7 (cut)
    with BuildSketch(Plane.XY.offset(15)):
        with Locations((-43.2006190121, 6.1430045813)):
            Rectangle(F2_W, F2_H)
        with Locations((-42.7006190121, 6.1430045813)):
            Rectangle(F2_W, F2_H)
        with Locations((-36.9506190121, 6.1430045813)):
            Rectangle(F2_W, F2_H)
        with Locations((-36.4506190121, 6.1430045813)):
            Rectangle(F2_W, F2_H)
        with Locations((-30.7006190121, 6.1430045813)):
            Rectangle(F2_W, F2_H)
        with Locations((-30.2006190121, 6.1430045813)):
            Rectangle(F2_W, F2_H)
        with Locations((-24.4506190121, 6.1430045813)):
            Rectangle(F2_W, F2_H)
        with Locations((-23.9506190121, 6.1430045813)):
            Rectangle(F2_W, F2_H)
        with Locations((-18.2006190121, 6.1430045813)):
            Rectangle(F2_W, F2_H)
        with Locations((-17.7006190121, 6.1430045813)):
            Rectangle(F2_W, F2_H)
        with Locations((-11.9506190121, 6.1430045813)):
            Rectangle(F2_W, F2_H)
        with Locations((-11.4506190121, 6.1430045813)):
            Rectangle(F2_W, F2_H)
        with Locations((-5.7006190121, 6.1430045813)):
            Rectangle(F2_W, F2_H)
        with Locations((-5.2006190121, 6.1430045813)):
            Rectangle(F2_W, F2_H)
        with Locations((0.5493809879, 6.1430045813)):
            Rectangle(F2_W, F2_H)
        with Locations((1.0493809879, 6.1430045813)):
            Rectangle(F2_W, F2_H)
        with Locations((6.7993809879, 6.1430045813)):
            Rectangle(F2_W, F2_H)
        with Locations((7.2993809879, 6.1430045813)):
            Rectangle(F2_W, F2_H)
        with Locations((13.0493809879, 6.1430045813)):
            Rectangle(F2_W, F2_H)
        with Locations((13.5493809879, 6.1430045813)):
            Rectangle(F2_W, F2_H)
        with Locations((19.2993809879, 6.1430045813)):
            Rectangle(F2_W, F2_H)
        with Locations((19.7993809879, 6.1430045813)):
            Rectangle(F2_W, F2_H)
        with Locations((25.5493809879, 6.1430045813)):
            Rectangle(F2_W, F2_H)
        with Locations((26.0493809879, 6.1430045813)):
            Rectangle(F2_W, F2_H)
        with Locations((31.7993809879, 6.1430045813)):
            Rectangle(F2_W, F2_H)
        with Locations((32.2993809879, 6.1430045813)):
            Rectangle(F2_W, F2_H)
        with Locations((38.0493809879, 6.1430045813)):
            Rectangle(F2_W, F2_H)
        with Locations((38.5493809879, 6.1430045813)):
            Rectangle(F2_W, F2_H)
        with Locations((44.2993809879, 6.1430045813)):
            Rectangle(F2_W, F2_H)
        with Locations((44.7993809879, 6.1430045813)):
            Rectangle(F2_W, F2_H)
        with Locations((50.5493809879, 6.1430045813)):
            Rectangle(F2_W, F2_H)
        with Locations((51.0493809879, 6.1430045813)):
            Rectangle(F2_W, F2_H)
        with Locations((56.7993809879, 6.1430045813)):
            Rectangle(F2_W, F2_H)
        with Locations((57.2993809879, 6.1430045813)):
            Rectangle(F2_W, F2_H)
        with Locations((63.0493809879, 6.1430045813)):
            Rectangle(F2_W, F2_H)
        with Locations((63.5493809879, 6.1430045813)):
            Rectangle(F2_W, F2_H)
        with Locations((69.2993809879, 6.1430045813)):
            Rectangle(F2_W, F2_H)
        with Locations((69.7993809879, 6.1430045813)):
            Rectangle(F2_W, F2_H)
        with Locations((75.5493809879, 6.1430045813)):
            Rectangle(F2_W, F2_H)
        with Locations((76.0493809879, 6.1430045813)):
            Rectangle(F2_W, F2_H)
    extrude(amount=-F7_DEPTH, mode=Mode.SUBTRACT)

    # F6 (on face) → F8 (cut)
    with BuildSketch(Plane(origin=(0, 15.6430045813, 0), x_dir=(-1, 0, 0), z_dir=(0, 1, 0))):
        with Locations((-59.220507741, 4.6769666951)):
            Rectangle(F6_W, F6_H)
        with Locations((59.220507741, 4.6769666951)):
            Rectangle(F6_W, F6_H)
    extrude(amount=-F8_DEPTH, mode=Mode.SUBTRACT)

    # F0 (on Top) → F9 (join)
    with BuildSketch(Plane.XY):
        with Locations((-9.4472066578, -3)):
            Rectangle(F0_W_8, F0_H_4)
        Polygon((127.116142965, 18), (127.116142965, -24), (-146.0105562806, -24), (-146.0105562806, -11.9704613462), (-146.0105562806, -8.9827831835), (-146.0105562806, -3), (-146.0105562806, 0), (-146.0105562806, 18), (-95.0105562806, 18), (-92.0105562806, 18), align=None, mode=Mode.SUBTRACT)
    extrude(amount=F9_DEPTH)

    # F10 (on face) → F11 (cut, symmetric)
    with BuildSketch(Plane(origin=(-149.0105562806, 0, 0), x_dir=(0, -1, 0), z_dir=(-1, 0, 0))):
        with Locations((4.2005600408, 6.9522475824)):
            Rectangle(F10_W, F10_H)
    extrude(amount=F11_DEPTH, both=True, mode=Mode.SUBTRACT)

    # F12
    f12_edges = [f1.edges().sort_by_distance(p)[0] for p in [
        (-149.010556, 21, 14),
        (130.116143, 21, 14),
        (-149.010556, -27, 14),
        (130.116143, -27, 14),
    ]]
    fillet(f12_edges, radius=F12_R)


solid = f1.part
